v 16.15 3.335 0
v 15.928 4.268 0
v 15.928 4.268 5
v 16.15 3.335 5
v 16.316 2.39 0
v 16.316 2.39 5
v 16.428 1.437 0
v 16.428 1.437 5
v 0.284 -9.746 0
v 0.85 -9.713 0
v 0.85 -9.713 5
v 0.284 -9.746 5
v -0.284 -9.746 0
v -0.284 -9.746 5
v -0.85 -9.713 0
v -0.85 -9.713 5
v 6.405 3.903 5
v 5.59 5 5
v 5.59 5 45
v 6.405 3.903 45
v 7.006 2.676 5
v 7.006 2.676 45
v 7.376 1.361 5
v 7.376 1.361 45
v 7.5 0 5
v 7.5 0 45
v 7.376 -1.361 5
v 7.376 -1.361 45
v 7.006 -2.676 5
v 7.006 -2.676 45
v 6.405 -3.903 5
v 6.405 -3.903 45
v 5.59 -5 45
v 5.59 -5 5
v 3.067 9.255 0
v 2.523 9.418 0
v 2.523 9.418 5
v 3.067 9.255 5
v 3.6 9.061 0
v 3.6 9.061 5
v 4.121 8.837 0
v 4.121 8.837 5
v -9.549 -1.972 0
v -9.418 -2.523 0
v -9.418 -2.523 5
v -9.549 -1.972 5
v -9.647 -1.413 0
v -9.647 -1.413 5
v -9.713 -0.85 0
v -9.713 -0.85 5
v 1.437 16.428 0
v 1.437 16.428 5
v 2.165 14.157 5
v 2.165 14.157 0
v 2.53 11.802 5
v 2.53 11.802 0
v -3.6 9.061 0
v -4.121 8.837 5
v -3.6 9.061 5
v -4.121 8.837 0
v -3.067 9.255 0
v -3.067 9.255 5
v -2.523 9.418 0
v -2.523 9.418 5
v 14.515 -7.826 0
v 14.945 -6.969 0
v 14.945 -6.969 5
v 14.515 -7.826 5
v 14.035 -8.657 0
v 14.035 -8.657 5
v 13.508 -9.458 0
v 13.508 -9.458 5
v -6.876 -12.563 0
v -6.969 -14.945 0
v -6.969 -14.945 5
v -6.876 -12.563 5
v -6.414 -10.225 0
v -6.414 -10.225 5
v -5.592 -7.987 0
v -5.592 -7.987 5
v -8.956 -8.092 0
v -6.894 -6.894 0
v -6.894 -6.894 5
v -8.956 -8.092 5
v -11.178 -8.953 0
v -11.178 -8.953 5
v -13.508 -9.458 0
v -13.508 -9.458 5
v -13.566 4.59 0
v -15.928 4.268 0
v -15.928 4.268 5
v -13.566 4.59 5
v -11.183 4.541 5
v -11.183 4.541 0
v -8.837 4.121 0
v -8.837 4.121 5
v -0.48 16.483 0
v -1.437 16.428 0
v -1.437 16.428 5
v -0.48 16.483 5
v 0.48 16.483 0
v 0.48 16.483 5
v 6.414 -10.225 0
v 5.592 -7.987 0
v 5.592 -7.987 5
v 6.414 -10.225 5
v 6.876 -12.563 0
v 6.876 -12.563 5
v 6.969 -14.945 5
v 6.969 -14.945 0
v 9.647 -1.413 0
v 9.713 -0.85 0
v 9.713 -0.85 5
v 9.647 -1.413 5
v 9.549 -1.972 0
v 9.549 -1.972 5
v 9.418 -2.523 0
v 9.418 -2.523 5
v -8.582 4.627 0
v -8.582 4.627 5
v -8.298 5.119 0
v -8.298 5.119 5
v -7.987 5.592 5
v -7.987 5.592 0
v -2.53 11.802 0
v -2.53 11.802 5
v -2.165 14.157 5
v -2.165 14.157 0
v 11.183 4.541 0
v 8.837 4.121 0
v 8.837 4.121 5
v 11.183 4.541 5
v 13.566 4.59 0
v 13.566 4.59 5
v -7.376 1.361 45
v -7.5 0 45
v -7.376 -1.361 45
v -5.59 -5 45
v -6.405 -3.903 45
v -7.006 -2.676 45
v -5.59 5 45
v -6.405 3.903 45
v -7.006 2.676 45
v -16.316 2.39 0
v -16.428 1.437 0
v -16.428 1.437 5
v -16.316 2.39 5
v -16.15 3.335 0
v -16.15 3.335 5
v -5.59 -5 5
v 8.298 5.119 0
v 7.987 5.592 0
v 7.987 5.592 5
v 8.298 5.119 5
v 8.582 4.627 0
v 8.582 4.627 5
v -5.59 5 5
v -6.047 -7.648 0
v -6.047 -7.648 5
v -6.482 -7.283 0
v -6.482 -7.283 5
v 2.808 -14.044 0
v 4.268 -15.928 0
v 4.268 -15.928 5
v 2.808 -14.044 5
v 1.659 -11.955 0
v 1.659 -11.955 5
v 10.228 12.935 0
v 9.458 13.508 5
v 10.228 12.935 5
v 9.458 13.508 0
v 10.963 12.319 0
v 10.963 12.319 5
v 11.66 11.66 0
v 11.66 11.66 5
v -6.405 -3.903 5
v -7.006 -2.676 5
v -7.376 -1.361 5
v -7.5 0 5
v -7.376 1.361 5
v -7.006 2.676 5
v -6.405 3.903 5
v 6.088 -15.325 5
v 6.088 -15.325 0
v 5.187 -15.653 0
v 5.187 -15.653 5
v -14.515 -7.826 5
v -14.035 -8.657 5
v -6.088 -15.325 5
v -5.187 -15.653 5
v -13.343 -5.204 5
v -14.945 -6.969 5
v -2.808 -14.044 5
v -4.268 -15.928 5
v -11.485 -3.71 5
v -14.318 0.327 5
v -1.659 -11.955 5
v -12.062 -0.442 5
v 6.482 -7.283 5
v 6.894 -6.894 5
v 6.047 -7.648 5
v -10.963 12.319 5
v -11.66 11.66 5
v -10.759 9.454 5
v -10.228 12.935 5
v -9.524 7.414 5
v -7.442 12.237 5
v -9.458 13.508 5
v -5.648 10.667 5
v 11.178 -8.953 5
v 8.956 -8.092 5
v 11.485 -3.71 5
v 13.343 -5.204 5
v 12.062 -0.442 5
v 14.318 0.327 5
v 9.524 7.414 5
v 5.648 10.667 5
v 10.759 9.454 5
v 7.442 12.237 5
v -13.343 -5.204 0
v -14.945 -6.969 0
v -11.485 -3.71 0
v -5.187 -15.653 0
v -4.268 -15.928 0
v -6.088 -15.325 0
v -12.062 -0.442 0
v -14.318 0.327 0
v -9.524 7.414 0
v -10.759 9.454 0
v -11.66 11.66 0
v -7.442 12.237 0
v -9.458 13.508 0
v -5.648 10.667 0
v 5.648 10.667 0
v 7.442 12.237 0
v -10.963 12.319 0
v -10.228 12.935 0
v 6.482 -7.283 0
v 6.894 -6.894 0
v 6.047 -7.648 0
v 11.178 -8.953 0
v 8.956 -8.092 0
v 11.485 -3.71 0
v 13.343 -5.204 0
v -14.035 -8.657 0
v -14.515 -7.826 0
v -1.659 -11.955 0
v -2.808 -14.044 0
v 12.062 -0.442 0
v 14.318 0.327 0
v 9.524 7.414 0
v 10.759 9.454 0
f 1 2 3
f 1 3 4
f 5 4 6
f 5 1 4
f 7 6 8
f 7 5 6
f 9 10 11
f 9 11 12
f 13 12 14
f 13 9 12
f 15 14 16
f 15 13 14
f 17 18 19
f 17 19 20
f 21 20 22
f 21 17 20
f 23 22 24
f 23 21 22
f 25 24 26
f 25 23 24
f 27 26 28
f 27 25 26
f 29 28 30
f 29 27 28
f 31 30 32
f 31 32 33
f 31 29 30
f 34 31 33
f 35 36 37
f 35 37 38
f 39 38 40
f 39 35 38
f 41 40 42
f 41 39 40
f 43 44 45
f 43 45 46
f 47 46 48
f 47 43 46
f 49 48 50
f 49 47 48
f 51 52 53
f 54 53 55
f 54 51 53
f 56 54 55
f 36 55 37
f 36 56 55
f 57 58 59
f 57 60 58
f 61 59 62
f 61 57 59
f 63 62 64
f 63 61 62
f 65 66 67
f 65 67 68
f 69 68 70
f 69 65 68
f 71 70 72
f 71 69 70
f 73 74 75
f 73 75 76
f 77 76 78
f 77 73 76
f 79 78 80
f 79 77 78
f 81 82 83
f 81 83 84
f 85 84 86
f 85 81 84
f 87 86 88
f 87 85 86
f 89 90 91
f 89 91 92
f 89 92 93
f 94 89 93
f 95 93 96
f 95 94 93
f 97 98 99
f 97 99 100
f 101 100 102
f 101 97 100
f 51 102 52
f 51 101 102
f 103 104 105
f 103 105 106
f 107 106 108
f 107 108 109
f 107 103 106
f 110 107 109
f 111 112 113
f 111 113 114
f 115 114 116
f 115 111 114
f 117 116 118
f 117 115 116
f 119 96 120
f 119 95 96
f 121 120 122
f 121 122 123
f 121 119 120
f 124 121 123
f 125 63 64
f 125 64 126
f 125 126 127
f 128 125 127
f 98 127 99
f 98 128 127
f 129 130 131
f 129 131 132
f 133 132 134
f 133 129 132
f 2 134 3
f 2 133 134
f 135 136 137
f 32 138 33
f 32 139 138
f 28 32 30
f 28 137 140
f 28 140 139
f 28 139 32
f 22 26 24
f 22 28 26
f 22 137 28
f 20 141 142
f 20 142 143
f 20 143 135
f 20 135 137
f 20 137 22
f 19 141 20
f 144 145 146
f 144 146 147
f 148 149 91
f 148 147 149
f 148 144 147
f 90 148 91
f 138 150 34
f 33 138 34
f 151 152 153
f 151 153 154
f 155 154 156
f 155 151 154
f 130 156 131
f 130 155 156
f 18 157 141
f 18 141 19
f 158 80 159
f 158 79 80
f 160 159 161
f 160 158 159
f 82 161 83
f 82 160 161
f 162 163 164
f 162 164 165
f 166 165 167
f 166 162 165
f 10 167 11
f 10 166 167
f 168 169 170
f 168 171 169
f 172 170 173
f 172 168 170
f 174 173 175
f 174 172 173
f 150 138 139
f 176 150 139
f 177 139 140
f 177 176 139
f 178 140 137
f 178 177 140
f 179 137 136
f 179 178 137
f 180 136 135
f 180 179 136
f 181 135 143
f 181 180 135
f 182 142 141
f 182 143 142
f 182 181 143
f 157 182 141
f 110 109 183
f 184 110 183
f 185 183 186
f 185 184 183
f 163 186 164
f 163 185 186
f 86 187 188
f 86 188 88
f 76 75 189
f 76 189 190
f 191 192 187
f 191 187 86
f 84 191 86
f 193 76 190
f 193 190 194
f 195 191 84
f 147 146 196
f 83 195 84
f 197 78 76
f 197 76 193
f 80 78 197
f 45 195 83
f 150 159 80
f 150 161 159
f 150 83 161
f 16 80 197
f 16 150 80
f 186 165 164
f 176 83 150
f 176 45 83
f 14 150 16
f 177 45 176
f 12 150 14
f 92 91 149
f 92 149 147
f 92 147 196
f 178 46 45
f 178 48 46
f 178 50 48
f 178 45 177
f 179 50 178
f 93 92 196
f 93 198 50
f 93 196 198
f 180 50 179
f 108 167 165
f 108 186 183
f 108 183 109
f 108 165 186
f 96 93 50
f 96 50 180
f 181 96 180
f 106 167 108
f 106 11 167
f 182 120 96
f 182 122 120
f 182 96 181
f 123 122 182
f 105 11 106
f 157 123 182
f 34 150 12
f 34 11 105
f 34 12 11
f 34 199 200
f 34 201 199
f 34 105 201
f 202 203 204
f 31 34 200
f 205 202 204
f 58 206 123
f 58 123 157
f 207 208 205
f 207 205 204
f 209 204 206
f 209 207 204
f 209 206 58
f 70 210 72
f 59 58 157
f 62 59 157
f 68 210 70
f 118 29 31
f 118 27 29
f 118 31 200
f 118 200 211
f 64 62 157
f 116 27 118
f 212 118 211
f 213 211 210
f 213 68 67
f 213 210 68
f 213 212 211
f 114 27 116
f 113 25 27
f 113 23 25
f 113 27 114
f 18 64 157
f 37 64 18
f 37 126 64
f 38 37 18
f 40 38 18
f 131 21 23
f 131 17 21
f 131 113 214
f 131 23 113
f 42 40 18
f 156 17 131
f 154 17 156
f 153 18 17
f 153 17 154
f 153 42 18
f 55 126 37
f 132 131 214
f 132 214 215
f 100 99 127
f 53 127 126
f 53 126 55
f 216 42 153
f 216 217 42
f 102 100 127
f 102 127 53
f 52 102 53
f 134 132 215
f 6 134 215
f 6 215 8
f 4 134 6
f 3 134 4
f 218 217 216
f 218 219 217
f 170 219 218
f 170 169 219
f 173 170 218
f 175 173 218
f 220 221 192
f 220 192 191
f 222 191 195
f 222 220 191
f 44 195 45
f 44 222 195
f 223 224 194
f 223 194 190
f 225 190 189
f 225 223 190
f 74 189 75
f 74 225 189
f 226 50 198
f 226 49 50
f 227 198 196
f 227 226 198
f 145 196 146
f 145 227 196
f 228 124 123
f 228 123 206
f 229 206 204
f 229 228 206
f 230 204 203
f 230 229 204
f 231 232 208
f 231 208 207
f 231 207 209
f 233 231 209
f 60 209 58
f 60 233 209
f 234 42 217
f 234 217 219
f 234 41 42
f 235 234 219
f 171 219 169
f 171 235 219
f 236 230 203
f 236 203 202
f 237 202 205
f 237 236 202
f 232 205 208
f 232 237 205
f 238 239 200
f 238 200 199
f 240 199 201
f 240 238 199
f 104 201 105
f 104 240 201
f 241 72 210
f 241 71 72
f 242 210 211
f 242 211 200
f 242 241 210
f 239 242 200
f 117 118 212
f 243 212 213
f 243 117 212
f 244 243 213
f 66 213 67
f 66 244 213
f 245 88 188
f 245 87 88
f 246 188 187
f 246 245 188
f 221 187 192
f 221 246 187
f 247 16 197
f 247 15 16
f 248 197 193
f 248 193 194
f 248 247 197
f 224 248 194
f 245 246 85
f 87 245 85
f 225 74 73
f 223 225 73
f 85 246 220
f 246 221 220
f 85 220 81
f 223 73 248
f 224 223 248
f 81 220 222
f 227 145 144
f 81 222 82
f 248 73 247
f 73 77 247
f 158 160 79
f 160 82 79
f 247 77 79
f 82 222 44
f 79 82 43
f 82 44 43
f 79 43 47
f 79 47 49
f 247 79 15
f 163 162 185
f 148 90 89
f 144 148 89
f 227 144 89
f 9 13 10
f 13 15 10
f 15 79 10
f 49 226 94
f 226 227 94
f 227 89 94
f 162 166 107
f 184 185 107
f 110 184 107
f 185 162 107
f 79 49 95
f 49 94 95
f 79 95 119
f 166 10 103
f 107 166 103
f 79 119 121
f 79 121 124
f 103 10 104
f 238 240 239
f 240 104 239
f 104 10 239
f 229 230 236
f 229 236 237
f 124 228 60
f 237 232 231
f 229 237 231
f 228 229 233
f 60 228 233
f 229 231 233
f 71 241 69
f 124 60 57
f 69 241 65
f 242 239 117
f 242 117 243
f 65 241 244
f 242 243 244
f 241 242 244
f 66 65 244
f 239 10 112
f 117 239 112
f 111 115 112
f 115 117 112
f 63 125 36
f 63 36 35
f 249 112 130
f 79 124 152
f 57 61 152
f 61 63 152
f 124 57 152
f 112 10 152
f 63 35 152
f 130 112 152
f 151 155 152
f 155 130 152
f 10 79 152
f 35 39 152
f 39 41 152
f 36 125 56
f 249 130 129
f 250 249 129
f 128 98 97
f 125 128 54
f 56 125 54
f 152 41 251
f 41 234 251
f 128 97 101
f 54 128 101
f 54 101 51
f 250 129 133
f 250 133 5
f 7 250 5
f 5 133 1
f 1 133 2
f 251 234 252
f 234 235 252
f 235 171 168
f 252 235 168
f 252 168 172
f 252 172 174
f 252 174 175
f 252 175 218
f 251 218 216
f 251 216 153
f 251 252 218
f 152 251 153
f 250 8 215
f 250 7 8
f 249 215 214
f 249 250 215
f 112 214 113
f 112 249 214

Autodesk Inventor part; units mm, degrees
sketch "Sketch1" plane through (0, 0, 0) normal (0, 0, 1) x (1, 0, 0)
  circle A0 centre (0, 0) radius 16.4903
  dimension "d0" = 32.9806
extrude "Extrusion1" add sketch "Sketch1" along normal blind 5
ref_plane "Work Plane2" through (0, 0, 2.5) normal (0, 0, 1) x (1, 0, 0)
sketch "Sketch2" plane through (0, 0, 0) normal (0, 0, -1) x (-1, 0, 0)
  circle A0 centre (0, 0) radius 16.4903 projected
  circle A1 centre (0, 0) radius 13.5855
  dimension "d3" = 27.171
surface extrude "Pitch Diameter" sketch "Sketch2" against normal through all shown no curves A1
ref_plane "Work Plane8" through (0, 0, 0) normal (0.9396926, 0.3420201, 0) x (0, 0, 1)
ref_plane "Work Plane9" through (0, 0, 0) normal (1, 0, 0) x (0, 1, 0)
spur gear teeth "Spur Gear" teeth 9 pitch diameter 27 tip diameter 32.9806 root diameter 19.5 face width 5 start plane through (0, 0, 0) normal (0, 0, -1) x (-1, 0, 0)
sketch "Sketch3" plane through (0, 0, 5) normal (0, 0, 1) x (1, 0, 0)
  circle A0 centre (0, 0) radius 7.5
  line L0 (0, 0) -> (0, 5)
  line L1 (0, 5) -> (-5.5902, 5)
  line L2 (0, 5) -> (5.5902, 5)
  line L3 (0, 0) -> (0, -5)
  line L4 (0, -5) -> (5.5902, -5)
  line L5 (0, -5) -> (-5.5902, -5)
  dimension "d49" = 15
  dimension "d50" = 5
  dimension "d51" = 5
extrude "Extrusion2" add sketch "Sketch3" along normal blind 40 contours A0 L4 L3 L0 L2 | L1 L0 L3 L5 A0
equation "\"d0\" = da_da"
equation "\"d1\" = da_b"
equation "\"d3\" = da_dw"
equation "\"d16\" = da_aw"
equation "\"d43\" = da_aw"
equation "\"d46\" = da_aw"
equation "\"da_da\" = 32.980581"
equation "\"da_b\" = 5"
equation "\"da_dw\" = 27.170952"
equation "\"da_aw\" = 164.535212"
properties part number "Drive_Spur" material "Steel"
